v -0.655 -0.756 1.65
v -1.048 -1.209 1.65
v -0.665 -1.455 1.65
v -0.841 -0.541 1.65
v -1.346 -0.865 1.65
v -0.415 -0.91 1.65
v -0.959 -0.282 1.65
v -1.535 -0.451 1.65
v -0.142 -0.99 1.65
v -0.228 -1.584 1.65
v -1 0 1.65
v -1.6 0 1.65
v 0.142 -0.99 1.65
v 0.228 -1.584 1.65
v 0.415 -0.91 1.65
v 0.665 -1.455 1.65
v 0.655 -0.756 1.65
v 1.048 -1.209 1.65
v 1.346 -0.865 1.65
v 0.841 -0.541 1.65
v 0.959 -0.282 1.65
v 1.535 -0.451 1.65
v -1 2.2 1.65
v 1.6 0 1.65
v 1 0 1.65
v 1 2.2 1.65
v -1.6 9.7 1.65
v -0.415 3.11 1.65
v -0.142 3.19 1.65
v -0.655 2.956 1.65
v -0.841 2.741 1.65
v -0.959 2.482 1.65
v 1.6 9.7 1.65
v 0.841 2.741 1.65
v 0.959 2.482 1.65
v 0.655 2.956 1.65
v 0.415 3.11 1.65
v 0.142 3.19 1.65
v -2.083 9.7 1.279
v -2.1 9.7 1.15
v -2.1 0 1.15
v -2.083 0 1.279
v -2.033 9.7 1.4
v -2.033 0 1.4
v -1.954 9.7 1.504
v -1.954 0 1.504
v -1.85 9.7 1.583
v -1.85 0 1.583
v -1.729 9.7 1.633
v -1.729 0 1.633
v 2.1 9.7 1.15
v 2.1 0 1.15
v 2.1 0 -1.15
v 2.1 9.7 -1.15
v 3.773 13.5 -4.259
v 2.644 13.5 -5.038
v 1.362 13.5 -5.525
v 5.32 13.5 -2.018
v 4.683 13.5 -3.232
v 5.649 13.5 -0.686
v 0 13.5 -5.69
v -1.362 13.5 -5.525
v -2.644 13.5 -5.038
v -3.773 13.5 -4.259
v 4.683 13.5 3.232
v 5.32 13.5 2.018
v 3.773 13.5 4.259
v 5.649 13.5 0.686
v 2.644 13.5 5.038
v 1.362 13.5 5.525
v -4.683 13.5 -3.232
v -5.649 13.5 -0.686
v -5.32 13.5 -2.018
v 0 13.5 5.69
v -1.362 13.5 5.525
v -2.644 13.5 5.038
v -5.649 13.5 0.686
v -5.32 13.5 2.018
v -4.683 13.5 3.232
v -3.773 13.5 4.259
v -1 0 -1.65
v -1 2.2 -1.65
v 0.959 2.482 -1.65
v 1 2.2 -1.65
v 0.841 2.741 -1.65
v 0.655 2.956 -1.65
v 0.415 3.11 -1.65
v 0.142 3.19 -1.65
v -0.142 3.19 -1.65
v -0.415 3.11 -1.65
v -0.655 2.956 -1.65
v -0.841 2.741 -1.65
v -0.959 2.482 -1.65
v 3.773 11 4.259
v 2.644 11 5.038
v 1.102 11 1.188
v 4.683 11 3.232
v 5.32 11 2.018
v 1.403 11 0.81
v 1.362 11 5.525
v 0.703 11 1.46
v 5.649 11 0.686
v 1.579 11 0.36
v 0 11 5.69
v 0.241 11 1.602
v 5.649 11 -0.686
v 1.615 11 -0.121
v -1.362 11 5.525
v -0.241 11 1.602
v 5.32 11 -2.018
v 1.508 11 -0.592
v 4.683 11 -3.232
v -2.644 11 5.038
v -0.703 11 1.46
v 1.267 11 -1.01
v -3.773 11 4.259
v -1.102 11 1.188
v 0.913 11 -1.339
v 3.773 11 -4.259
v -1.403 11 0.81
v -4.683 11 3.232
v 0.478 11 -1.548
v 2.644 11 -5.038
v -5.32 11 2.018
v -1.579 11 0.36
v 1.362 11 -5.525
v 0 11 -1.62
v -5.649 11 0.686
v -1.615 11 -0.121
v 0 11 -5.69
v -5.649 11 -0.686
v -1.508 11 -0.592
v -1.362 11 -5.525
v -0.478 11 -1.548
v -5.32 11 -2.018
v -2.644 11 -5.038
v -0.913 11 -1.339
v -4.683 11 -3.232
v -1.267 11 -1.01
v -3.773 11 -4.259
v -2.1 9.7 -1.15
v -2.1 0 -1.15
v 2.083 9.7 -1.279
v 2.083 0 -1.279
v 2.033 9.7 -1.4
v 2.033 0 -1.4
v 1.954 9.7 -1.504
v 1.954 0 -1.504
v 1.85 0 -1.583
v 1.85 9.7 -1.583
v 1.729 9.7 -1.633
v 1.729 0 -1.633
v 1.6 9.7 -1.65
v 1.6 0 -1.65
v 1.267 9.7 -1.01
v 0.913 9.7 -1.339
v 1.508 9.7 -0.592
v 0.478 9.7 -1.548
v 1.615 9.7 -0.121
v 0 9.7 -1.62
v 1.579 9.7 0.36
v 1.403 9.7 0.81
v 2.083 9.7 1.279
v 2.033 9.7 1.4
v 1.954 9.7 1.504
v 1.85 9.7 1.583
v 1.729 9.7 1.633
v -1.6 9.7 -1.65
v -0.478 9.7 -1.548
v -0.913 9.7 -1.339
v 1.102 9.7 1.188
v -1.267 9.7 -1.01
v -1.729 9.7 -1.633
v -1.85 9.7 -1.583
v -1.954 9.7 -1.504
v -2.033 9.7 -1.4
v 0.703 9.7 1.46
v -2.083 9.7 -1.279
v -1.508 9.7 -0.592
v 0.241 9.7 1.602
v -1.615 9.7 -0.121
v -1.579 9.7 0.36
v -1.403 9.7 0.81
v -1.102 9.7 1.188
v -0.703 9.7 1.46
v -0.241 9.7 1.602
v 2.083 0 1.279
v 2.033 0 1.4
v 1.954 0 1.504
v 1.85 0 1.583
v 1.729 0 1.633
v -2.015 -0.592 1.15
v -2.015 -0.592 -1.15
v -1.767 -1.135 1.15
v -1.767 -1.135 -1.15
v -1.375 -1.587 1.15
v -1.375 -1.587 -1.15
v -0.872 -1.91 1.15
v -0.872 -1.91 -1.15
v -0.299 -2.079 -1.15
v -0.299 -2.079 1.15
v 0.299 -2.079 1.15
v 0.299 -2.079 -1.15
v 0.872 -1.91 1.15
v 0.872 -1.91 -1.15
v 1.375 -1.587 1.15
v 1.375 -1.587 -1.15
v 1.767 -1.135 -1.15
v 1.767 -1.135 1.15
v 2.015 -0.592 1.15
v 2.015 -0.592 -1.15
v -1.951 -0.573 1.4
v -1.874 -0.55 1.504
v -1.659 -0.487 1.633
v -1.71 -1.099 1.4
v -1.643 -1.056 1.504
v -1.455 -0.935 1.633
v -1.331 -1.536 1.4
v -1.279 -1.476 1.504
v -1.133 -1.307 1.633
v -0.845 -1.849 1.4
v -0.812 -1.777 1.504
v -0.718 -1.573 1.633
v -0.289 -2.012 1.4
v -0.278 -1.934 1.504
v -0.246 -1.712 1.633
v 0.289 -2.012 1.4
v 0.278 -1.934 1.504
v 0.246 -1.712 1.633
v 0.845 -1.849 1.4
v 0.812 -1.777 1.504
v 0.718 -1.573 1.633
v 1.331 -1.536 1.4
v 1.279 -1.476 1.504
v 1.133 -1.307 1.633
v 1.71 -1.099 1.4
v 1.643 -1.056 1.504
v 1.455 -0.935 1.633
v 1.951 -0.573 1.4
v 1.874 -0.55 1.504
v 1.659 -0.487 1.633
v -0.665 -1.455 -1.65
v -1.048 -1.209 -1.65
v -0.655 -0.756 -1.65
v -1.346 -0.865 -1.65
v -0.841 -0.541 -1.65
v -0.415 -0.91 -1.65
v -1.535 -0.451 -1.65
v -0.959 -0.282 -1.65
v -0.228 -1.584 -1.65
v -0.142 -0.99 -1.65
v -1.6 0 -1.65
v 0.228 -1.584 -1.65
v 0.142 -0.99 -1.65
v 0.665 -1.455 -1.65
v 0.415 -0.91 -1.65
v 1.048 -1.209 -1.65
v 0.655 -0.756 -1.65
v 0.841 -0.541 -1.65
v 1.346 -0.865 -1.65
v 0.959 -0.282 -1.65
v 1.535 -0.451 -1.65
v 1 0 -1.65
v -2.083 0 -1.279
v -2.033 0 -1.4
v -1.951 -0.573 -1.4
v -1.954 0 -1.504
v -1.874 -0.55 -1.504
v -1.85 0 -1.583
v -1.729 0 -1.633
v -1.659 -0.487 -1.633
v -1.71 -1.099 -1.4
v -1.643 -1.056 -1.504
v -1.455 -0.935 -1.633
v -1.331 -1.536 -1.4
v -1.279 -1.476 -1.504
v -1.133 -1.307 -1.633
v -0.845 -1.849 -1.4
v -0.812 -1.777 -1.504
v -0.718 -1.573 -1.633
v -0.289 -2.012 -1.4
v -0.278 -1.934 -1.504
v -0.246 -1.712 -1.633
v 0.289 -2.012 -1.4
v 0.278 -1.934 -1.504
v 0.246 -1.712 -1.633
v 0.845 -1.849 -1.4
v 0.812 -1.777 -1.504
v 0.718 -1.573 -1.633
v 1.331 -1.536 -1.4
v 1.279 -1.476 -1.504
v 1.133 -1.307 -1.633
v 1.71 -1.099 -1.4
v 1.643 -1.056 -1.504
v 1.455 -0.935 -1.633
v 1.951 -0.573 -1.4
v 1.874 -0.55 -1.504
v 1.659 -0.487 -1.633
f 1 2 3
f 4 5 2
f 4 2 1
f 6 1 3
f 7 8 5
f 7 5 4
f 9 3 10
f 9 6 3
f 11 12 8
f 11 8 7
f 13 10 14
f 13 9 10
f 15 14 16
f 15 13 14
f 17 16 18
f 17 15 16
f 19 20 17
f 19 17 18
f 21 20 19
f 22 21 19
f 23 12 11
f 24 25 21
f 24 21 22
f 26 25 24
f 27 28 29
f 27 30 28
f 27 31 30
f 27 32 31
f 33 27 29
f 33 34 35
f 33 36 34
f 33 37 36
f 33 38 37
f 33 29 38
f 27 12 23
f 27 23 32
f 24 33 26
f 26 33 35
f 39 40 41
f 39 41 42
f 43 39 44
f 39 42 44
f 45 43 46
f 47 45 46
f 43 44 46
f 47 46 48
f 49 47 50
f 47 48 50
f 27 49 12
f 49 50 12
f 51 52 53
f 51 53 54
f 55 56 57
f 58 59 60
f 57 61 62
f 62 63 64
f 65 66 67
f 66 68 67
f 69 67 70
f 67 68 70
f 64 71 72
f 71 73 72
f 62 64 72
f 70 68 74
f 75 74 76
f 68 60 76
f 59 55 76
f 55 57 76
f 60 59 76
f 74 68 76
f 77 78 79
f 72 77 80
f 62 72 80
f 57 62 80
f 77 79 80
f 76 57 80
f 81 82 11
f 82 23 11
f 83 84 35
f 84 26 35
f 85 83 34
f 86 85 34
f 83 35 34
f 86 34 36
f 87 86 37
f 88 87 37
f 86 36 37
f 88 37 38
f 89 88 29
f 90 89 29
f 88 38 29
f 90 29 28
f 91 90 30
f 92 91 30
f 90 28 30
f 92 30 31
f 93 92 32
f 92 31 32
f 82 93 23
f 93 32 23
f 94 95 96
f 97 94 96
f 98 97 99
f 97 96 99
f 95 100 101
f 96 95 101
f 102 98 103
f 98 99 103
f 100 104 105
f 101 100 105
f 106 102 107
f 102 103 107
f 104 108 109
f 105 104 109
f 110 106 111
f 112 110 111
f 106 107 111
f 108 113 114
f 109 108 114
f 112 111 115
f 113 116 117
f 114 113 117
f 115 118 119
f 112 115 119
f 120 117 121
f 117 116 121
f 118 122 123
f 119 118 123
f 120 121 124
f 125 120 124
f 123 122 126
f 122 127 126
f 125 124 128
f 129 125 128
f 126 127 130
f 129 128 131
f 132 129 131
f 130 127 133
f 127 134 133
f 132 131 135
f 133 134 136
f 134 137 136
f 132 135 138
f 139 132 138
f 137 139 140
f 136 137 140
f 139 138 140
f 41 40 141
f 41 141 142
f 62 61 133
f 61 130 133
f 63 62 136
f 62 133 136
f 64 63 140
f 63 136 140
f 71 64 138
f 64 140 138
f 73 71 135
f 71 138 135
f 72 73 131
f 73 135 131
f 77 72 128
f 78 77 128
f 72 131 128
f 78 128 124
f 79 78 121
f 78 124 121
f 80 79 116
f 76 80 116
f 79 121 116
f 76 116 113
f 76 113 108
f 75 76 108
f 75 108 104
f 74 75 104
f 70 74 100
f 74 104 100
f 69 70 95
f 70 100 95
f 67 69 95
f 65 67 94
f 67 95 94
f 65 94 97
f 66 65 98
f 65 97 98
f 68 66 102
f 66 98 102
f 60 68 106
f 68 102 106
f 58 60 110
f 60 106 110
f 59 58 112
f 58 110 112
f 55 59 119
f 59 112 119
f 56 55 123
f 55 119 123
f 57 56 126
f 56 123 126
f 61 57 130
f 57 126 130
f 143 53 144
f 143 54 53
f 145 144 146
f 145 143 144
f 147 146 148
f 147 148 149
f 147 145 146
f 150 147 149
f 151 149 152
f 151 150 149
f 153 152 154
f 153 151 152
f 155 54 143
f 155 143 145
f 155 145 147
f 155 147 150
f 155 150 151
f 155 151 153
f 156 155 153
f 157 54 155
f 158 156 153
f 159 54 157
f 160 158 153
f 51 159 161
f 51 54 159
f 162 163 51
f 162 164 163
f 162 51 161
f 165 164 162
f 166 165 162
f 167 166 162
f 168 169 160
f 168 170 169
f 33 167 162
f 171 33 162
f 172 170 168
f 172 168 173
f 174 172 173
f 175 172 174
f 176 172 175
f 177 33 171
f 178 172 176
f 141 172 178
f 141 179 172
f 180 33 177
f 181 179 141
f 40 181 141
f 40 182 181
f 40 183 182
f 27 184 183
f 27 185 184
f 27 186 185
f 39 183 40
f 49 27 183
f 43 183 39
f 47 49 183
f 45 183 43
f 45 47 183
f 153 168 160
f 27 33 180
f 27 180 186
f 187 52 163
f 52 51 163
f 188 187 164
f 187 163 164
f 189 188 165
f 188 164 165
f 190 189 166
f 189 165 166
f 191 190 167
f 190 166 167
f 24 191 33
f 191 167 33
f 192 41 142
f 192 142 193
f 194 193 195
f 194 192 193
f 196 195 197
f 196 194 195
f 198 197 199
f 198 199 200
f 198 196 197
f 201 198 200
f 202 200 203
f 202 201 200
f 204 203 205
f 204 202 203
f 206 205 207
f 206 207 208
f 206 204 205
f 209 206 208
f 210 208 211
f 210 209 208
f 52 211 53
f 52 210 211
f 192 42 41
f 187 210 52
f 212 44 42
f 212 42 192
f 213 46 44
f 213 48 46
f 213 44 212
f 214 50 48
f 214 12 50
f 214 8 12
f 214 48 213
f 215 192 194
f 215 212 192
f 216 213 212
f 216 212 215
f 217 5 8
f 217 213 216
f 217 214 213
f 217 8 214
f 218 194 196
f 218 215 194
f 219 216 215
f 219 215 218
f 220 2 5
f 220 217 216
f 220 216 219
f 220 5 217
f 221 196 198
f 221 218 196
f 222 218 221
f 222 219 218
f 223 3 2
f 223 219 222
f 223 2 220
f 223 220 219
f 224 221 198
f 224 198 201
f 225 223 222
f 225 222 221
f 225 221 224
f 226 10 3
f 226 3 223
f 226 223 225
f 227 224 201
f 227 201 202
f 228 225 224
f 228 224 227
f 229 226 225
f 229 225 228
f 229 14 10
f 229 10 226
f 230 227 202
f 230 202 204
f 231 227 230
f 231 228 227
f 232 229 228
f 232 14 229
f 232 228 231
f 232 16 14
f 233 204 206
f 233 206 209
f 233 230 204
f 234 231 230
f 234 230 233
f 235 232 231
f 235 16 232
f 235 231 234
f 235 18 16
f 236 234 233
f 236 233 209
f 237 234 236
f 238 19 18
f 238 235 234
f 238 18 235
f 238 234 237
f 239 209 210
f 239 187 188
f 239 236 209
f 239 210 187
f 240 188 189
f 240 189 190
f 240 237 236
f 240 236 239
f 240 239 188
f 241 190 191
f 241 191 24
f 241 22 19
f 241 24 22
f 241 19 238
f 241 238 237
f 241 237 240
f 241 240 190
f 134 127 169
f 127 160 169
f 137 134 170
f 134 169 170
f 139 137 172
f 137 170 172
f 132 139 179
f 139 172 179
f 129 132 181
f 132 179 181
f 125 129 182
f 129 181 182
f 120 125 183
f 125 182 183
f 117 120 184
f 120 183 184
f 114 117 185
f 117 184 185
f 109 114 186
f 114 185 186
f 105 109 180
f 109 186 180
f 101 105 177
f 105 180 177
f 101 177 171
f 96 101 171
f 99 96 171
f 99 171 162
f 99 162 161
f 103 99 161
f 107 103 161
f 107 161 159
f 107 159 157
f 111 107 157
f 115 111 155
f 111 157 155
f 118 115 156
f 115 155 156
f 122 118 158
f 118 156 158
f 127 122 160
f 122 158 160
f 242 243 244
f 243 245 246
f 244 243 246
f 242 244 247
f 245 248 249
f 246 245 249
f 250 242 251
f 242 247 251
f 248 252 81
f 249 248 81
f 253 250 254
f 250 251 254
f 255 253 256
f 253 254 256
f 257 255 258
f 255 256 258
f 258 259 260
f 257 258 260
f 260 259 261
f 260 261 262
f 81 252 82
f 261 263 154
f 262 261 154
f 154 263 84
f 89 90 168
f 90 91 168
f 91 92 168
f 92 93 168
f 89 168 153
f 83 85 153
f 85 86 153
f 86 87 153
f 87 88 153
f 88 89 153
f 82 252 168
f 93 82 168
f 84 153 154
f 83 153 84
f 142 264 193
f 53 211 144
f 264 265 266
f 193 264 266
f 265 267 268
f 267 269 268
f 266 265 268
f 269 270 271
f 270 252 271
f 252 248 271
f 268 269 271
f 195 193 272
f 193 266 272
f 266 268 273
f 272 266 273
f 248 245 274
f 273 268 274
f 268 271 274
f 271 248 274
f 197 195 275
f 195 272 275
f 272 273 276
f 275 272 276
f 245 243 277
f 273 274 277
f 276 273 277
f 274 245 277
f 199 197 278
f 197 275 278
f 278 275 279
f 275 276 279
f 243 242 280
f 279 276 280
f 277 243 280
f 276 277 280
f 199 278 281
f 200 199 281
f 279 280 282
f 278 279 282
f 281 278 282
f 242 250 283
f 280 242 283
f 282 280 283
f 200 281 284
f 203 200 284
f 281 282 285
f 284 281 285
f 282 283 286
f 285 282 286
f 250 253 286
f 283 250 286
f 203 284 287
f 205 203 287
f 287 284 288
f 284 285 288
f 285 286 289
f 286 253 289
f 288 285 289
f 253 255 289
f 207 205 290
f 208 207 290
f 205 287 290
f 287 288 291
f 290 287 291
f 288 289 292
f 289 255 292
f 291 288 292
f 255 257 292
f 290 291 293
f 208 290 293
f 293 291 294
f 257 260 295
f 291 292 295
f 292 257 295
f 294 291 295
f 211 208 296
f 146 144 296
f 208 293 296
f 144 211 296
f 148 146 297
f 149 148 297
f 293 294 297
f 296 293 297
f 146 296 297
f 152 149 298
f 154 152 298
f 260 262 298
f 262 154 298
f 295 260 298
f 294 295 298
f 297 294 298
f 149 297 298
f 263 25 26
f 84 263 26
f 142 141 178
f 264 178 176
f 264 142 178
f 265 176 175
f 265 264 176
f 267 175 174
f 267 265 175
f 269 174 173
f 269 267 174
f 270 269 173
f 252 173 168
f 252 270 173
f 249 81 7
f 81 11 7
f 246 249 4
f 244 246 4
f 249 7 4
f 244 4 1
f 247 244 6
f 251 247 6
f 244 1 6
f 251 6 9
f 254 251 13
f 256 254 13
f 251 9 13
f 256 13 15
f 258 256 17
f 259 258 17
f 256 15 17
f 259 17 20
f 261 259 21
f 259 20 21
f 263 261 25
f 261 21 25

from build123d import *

# Parameters (mm, degrees)
BOSS_EXTRUDE1_DEPTH = 1.65
FILLET1_R           = 0.5


with BuildPart() as part:
    # Sketch1 → Boss-Extrude1 (new, symmetric)
    with BuildSketch(Plane.XY):
        with BuildLine():
            Line((2.1, 0), (2.1, 9.7))
            Line((2.1, 9.7), (-2.1, 9.7))
            Line((-2.1, 9.7), (-2.1, 0))
            ThreePointArc((-2.1, 0), (0, -2.1), (2.1, 0))
        make_face()
        with BuildLine():
            Line((1, 0), (1, 2.2))
            ThreePointArc((1, 2.2), (0, 3.2), (-1, 2.2))
            Line((-1, 2.2), (-1, 0))
            ThreePointArc((-1, 0), (0, -1), (1, 0))
        make_face(mode=Mode.SUBTRACT)
    extrude(amount=BOSS_EXTRUDE1_DEPTH, both=True)

    # Sketch2 → Revolve1 (revolve)
    with BuildSketch(Plane.XY, mode=Mode.PRIVATE) as revolve1_sk:
        Polygon((0, 13.5), (5.69, 13.5), (5.69, 11), (1.62, 11), (1.62, 9.7), (0, 9.7), align=None)
    revolve(revolve1_sk.sketch.rotate(Axis((0, 9.7, 0), (0, 1, 0)), 90), axis=Axis((0, 9.7, 0), (0, 1, 0)))

    # Fillet1
    fillet1_edges = [part.edges().sort_by_distance(p)[0] for p in [
        (2.1, 4.85, 1.65),
        (-2.1, 4.85, 1.65),
        (2.1, 4.85, -1.65),
        (0, -2.1, -1.65),
        (-2.1, 4.85, -1.65),
        (0, -2.1, 1.65),
    ]]
    fillet(fillet1_edges, radius=FILLET1_R)


solid = part.part
